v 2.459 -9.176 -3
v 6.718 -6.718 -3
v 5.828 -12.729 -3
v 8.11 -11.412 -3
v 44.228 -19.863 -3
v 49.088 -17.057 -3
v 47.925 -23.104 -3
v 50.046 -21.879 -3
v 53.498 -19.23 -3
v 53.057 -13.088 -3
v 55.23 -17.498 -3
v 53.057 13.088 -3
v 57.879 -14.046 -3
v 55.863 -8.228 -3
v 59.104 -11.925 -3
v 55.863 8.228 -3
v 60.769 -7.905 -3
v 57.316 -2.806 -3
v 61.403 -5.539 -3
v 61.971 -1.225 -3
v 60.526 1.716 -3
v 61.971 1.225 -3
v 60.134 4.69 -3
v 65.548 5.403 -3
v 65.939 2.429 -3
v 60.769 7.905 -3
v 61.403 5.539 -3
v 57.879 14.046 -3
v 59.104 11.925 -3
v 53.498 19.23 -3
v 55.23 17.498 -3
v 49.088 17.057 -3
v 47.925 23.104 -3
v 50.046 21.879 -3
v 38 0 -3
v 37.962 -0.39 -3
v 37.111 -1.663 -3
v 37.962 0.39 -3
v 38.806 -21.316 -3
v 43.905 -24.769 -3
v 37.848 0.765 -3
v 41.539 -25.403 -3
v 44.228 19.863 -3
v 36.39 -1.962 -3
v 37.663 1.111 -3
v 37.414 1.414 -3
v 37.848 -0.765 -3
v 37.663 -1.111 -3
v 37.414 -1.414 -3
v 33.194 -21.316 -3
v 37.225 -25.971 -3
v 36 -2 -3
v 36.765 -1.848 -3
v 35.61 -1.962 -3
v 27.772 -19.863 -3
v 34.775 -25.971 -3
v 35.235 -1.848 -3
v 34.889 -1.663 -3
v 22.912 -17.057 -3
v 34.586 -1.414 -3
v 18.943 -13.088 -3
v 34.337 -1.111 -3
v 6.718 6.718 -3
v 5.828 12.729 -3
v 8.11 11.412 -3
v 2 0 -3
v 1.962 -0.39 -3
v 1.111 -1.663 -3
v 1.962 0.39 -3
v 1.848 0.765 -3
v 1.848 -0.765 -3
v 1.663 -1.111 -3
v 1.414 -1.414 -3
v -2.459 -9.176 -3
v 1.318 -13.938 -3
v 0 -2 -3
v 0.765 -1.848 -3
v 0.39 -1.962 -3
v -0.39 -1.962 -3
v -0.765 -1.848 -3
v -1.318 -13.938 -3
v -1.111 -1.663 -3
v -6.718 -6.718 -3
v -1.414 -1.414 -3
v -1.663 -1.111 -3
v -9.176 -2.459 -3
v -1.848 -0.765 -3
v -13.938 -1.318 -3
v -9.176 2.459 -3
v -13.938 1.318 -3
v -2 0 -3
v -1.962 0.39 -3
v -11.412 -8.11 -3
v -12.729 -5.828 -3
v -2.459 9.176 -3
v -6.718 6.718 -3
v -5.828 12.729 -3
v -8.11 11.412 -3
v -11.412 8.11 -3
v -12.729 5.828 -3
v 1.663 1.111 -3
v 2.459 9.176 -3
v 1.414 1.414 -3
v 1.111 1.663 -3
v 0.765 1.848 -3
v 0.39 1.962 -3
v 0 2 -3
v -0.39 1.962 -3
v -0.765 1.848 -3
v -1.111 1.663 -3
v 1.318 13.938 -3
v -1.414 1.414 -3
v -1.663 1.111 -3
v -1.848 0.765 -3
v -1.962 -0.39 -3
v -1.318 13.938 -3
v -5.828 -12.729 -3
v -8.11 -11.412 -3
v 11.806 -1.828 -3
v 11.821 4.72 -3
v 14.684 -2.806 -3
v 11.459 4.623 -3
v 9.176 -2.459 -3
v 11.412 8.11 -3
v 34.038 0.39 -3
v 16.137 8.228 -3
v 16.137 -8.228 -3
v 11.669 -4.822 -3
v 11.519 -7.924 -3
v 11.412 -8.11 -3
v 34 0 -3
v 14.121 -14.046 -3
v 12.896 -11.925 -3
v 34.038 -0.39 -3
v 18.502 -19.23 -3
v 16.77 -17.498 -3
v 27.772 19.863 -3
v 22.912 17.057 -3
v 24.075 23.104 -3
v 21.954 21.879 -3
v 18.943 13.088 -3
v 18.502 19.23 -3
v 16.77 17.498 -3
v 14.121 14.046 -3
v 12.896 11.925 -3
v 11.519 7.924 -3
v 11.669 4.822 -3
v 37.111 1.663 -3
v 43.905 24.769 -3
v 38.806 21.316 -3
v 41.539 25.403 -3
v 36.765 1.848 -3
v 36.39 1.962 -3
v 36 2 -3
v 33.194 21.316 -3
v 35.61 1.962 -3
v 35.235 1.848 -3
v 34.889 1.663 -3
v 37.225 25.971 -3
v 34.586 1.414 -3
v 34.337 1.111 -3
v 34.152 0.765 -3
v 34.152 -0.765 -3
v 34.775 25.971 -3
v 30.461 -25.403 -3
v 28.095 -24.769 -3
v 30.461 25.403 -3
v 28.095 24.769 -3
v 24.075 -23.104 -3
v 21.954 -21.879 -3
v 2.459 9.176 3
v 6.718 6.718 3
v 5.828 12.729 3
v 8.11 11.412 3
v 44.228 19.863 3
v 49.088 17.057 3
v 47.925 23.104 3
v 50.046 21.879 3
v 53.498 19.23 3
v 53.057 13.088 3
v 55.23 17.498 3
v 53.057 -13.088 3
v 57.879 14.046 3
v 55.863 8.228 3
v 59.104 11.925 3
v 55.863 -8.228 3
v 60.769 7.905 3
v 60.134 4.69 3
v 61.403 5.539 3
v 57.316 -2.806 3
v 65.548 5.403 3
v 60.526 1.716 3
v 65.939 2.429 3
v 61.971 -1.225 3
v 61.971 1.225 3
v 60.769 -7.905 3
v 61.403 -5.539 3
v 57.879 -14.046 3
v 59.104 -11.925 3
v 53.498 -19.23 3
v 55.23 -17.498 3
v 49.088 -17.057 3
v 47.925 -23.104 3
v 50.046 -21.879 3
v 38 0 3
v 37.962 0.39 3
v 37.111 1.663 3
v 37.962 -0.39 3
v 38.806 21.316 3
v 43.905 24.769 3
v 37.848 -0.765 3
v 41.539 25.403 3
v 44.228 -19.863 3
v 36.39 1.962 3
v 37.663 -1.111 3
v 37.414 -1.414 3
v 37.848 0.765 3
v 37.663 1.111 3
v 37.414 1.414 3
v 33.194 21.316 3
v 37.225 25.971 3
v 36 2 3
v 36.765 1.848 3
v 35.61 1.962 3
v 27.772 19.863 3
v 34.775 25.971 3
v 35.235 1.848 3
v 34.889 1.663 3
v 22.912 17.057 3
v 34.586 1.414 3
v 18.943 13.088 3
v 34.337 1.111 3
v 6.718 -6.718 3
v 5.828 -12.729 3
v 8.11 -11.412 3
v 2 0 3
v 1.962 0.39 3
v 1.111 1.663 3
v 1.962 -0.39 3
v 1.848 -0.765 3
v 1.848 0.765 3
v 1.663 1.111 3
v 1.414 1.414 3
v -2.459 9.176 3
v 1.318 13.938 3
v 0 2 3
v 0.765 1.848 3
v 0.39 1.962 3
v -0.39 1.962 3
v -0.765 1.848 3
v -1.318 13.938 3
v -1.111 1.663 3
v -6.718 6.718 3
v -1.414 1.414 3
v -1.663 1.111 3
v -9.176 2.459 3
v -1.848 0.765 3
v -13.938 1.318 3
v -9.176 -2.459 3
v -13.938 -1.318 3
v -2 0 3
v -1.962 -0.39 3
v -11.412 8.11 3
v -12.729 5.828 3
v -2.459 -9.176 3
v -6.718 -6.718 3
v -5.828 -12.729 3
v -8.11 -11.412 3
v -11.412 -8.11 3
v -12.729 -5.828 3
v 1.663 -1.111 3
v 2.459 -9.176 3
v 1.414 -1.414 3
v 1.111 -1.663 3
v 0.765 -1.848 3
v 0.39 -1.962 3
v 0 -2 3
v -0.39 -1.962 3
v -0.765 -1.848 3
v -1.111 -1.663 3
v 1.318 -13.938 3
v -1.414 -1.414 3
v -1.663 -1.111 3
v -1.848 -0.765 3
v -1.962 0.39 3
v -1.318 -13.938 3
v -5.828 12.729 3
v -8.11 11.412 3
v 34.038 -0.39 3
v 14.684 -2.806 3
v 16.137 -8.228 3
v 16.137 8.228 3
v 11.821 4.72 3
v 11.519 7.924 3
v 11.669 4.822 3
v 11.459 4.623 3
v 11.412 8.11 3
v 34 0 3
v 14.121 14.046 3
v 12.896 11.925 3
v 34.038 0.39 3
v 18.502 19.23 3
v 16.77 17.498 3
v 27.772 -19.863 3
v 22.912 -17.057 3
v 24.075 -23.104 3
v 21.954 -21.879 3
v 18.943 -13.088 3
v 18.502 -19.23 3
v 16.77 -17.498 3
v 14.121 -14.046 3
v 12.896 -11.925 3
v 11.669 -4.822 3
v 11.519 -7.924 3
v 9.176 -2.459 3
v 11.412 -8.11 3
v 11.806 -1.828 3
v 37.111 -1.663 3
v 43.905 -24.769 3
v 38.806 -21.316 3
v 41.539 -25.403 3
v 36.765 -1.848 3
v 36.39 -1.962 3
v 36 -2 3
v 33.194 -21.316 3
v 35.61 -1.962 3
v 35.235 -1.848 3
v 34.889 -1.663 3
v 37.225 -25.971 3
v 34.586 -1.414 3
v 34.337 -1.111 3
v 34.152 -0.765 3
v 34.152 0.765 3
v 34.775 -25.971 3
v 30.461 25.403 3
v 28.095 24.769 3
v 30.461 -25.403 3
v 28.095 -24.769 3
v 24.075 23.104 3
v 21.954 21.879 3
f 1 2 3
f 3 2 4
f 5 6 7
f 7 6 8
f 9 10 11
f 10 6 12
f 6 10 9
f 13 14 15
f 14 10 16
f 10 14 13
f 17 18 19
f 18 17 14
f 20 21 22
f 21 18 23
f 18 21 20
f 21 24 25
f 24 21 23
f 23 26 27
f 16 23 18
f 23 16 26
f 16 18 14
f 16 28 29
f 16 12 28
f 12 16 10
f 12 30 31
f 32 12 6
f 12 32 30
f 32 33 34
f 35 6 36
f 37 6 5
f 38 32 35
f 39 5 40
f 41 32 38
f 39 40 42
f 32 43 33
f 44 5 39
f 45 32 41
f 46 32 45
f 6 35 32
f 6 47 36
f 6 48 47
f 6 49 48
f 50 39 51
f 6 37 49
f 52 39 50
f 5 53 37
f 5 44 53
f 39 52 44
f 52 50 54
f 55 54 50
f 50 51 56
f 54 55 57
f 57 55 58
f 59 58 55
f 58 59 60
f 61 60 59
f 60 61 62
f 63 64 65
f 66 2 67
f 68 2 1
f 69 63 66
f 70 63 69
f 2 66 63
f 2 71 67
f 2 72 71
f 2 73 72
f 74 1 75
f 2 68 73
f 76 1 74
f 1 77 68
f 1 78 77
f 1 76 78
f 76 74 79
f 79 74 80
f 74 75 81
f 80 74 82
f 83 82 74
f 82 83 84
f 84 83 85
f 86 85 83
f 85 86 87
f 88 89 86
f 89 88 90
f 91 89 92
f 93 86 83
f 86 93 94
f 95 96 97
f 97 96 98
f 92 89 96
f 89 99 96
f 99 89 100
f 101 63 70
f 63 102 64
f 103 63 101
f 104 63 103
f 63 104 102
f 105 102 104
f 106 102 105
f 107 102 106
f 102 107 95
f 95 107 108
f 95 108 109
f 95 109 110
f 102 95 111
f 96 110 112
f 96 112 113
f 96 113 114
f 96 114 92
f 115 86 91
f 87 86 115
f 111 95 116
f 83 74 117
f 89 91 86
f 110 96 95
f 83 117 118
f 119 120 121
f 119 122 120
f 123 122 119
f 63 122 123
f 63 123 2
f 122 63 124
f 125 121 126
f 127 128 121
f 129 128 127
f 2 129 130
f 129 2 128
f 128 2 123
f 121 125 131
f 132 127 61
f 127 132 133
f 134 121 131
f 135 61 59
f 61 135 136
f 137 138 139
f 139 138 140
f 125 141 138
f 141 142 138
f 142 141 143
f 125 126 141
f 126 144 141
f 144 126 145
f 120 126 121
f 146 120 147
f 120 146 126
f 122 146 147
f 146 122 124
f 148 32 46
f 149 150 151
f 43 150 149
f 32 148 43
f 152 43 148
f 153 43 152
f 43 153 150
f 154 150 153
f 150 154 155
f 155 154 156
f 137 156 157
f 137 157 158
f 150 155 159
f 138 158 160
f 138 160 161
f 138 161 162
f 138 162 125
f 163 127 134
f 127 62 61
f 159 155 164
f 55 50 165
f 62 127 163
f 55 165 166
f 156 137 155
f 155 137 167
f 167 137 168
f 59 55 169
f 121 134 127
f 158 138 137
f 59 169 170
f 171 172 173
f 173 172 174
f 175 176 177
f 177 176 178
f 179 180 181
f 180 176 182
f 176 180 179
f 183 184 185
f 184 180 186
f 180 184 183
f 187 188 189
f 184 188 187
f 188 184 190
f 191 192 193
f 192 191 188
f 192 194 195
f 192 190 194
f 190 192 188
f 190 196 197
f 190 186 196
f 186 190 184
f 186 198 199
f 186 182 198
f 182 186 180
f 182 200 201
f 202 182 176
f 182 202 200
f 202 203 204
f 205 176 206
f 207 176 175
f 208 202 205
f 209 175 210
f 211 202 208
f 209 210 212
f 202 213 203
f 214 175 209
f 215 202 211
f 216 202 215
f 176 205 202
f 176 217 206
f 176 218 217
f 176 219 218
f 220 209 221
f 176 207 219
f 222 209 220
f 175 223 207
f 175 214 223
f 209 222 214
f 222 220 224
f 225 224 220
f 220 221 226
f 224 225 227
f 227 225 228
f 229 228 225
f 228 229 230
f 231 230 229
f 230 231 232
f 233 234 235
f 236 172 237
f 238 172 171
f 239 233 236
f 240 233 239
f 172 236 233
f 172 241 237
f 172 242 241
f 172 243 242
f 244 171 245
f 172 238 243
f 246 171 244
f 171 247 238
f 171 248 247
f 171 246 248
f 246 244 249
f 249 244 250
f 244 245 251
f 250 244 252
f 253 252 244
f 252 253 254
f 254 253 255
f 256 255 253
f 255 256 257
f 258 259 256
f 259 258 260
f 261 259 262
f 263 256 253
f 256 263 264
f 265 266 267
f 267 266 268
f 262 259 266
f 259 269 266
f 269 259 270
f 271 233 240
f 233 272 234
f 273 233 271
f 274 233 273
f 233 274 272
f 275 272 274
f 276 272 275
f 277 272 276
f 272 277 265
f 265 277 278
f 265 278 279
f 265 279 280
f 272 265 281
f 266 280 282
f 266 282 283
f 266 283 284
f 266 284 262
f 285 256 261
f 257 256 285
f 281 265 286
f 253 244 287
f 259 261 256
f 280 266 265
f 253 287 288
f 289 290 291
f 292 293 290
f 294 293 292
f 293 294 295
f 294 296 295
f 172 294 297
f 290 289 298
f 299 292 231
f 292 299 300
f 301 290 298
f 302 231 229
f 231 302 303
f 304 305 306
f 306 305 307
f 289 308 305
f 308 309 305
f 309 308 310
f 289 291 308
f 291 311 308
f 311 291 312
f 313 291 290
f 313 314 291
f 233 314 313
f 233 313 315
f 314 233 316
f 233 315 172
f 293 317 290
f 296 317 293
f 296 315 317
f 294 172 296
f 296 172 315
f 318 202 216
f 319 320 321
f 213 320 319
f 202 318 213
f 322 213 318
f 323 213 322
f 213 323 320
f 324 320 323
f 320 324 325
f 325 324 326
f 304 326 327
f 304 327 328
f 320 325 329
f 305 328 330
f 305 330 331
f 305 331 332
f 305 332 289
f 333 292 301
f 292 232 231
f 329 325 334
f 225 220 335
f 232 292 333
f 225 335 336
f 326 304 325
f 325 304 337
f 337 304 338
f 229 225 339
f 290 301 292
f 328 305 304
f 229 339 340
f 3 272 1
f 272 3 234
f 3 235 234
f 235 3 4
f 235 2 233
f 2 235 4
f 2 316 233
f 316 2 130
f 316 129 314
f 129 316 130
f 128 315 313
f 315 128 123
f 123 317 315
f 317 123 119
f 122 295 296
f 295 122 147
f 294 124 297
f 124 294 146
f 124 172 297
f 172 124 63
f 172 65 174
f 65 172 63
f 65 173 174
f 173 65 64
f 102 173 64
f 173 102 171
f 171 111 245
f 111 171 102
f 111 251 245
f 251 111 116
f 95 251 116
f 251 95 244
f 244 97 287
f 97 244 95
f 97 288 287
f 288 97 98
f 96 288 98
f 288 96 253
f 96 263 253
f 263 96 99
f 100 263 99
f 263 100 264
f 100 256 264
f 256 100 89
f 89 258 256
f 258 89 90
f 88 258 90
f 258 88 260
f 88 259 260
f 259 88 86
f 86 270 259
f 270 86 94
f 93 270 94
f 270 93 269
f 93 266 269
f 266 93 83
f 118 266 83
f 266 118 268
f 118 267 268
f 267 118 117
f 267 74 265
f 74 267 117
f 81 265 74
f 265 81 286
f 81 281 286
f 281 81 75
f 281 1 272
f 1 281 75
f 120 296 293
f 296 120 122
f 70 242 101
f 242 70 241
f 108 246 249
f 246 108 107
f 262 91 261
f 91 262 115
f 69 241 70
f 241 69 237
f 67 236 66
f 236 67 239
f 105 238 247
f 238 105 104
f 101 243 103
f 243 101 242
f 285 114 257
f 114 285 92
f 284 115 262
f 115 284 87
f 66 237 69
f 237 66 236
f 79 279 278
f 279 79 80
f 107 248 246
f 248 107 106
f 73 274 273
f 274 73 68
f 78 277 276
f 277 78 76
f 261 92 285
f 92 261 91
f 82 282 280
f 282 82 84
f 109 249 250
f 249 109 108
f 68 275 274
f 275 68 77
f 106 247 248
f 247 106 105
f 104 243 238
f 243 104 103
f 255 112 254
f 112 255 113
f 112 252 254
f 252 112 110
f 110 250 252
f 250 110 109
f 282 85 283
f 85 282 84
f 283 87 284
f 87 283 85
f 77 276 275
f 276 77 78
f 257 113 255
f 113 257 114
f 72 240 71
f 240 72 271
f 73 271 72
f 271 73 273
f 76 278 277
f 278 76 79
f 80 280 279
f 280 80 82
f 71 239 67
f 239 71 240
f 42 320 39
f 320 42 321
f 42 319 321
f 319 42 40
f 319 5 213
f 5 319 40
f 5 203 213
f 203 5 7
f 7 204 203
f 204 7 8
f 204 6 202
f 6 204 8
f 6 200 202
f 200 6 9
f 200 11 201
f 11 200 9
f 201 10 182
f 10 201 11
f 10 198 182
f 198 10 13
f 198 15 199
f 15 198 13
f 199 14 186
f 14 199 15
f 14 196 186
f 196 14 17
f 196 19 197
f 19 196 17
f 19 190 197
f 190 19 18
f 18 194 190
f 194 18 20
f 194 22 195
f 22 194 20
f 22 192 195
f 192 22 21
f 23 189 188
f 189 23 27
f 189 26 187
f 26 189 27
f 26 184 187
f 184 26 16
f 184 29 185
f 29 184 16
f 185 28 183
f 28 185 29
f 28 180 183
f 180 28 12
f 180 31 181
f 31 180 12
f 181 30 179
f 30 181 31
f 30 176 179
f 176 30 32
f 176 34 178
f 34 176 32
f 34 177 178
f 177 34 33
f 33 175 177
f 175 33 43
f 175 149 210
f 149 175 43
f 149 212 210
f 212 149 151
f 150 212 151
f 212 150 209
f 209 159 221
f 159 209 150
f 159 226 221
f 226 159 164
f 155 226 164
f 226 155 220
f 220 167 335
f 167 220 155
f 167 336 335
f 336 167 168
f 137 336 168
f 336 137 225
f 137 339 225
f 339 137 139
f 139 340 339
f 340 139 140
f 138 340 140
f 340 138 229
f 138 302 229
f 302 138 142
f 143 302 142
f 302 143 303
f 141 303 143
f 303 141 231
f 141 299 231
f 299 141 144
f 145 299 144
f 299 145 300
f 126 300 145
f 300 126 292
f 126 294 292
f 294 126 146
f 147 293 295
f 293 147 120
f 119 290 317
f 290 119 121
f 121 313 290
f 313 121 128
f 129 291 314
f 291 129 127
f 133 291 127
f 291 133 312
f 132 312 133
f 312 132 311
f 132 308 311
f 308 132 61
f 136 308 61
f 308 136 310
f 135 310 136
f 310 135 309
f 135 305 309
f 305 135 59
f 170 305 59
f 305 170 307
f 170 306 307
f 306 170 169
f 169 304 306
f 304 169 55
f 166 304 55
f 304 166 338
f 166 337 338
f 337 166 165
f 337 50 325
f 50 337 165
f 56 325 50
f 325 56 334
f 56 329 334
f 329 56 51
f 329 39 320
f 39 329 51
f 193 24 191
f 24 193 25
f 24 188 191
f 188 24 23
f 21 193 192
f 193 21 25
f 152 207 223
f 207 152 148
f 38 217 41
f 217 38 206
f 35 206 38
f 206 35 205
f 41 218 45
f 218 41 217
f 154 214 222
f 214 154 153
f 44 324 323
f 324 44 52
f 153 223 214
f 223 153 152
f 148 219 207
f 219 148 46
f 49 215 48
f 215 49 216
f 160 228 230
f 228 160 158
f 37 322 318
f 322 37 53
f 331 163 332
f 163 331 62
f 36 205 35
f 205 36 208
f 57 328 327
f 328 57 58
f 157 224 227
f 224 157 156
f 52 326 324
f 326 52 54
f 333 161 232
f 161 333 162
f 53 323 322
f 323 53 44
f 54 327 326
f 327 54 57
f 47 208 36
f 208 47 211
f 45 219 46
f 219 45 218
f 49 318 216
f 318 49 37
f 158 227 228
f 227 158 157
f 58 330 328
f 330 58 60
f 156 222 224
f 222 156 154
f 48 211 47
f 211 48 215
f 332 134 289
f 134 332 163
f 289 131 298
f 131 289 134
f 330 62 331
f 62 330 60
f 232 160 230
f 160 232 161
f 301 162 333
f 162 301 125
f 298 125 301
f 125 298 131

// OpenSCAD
// Original external spur-gear pair fixture, millimetres.
// Two gears with a radial index tab; the tab is a measurement feature, not a
// claim about tooth contact, backlash, strength or manufacturing tolerance.
agentscad_part = "all";
agentscad_pose = false;
input_deg = 0;
ratio_sign = -1;

module_mm = 2;
pinion_teeth = 12;
wheel_teeth = 24;
thickness = 6;
center_distance = module_mm * (pinion_teeth + wheel_teeth) / 2;
pinion_pitch = module_mm * pinion_teeth / 2;
wheel_pitch = module_mm * wheel_teeth / 2;
addendum = module_mm;
dedendum = 1.25 * module_mm;
marker_min_r_mm = 0;
marker_max_r_mm = 0;

wheel_angle_deg = ratio_sign * input_deg * pinion_teeth / wheel_teeth;

module gear_outline(teeth, pitch_radius) {
  tip_radius = pitch_radius + addendum;
  root_radius = pitch_radius - dedendum;
  half_pitch_deg = 180 / teeth;
  tip_half_deg = 0.18 * 360 / teeth;
  points = [
    for (i = [0 : teeth - 1], k = [0 : 2])
      let (a = i * 360 / teeth + (k == 0 ? -half_pitch_deg : (k == 1 ? -tip_half_deg : tip_half_deg)),
           r = k == 0 ? root_radius : tip_radius)
      [r * cos(a), r * sin(a)]
  ];
  linear_extrude(height = thickness, center = true, convexity = 10)
    polygon(points = points);
}

module gear_body(teeth, pitch_radius) {
  root_r = pitch_radius - dedendum;
  tip_r = pitch_radius + addendum;
  // Radial index tab in a root gap (half a tooth pitch from the first tooth).
  // Its outer vertices are the only measurement feature outside the addendum.
  marker_angle = 180 / teeth;
  marker_outer_r = tip_r + 4;
  marker_inner_r = root_r - 0.5;
  difference() {
    union() {
      gear_outline(teeth, pitch_radius);
      rotate([0, 0, marker_angle])
        translate([(marker_inner_r + marker_outer_r) / 2, 0, 0])
          cube([marker_outer_r - marker_inner_r, 3, thickness], center = true);
    }
    cylinder(h = thickness + 2, r = 2, center = true, $fn = 32);
  }
}

module pinion_local() { gear_body(pinion_teeth, pinion_pitch); }
module wheel_local() { gear_body(wheel_teeth, wheel_pitch); }

module generated_part() {
  if (agentscad_part == "pinion") {
    pinion_local();
  } else if (agentscad_part == "wheel") {
    wheel_local();
  } else if (agentscad_part == "pinion_pose") {
    rotate([0, 0, input_deg]) pinion_local();
  } else if (agentscad_part == "wheel_pose") {
    translate([center_distance, 0, 0])
      rotate([0, 0, wheel_angle_deg]) wheel_local();
  } else {
    rotate([0, 0, input_deg]) pinion_local();
    translate([center_distance, 0, 0])
      rotate([0, 0, wheel_angle_deg]) wheel_local();
  }
}

generated_part();
